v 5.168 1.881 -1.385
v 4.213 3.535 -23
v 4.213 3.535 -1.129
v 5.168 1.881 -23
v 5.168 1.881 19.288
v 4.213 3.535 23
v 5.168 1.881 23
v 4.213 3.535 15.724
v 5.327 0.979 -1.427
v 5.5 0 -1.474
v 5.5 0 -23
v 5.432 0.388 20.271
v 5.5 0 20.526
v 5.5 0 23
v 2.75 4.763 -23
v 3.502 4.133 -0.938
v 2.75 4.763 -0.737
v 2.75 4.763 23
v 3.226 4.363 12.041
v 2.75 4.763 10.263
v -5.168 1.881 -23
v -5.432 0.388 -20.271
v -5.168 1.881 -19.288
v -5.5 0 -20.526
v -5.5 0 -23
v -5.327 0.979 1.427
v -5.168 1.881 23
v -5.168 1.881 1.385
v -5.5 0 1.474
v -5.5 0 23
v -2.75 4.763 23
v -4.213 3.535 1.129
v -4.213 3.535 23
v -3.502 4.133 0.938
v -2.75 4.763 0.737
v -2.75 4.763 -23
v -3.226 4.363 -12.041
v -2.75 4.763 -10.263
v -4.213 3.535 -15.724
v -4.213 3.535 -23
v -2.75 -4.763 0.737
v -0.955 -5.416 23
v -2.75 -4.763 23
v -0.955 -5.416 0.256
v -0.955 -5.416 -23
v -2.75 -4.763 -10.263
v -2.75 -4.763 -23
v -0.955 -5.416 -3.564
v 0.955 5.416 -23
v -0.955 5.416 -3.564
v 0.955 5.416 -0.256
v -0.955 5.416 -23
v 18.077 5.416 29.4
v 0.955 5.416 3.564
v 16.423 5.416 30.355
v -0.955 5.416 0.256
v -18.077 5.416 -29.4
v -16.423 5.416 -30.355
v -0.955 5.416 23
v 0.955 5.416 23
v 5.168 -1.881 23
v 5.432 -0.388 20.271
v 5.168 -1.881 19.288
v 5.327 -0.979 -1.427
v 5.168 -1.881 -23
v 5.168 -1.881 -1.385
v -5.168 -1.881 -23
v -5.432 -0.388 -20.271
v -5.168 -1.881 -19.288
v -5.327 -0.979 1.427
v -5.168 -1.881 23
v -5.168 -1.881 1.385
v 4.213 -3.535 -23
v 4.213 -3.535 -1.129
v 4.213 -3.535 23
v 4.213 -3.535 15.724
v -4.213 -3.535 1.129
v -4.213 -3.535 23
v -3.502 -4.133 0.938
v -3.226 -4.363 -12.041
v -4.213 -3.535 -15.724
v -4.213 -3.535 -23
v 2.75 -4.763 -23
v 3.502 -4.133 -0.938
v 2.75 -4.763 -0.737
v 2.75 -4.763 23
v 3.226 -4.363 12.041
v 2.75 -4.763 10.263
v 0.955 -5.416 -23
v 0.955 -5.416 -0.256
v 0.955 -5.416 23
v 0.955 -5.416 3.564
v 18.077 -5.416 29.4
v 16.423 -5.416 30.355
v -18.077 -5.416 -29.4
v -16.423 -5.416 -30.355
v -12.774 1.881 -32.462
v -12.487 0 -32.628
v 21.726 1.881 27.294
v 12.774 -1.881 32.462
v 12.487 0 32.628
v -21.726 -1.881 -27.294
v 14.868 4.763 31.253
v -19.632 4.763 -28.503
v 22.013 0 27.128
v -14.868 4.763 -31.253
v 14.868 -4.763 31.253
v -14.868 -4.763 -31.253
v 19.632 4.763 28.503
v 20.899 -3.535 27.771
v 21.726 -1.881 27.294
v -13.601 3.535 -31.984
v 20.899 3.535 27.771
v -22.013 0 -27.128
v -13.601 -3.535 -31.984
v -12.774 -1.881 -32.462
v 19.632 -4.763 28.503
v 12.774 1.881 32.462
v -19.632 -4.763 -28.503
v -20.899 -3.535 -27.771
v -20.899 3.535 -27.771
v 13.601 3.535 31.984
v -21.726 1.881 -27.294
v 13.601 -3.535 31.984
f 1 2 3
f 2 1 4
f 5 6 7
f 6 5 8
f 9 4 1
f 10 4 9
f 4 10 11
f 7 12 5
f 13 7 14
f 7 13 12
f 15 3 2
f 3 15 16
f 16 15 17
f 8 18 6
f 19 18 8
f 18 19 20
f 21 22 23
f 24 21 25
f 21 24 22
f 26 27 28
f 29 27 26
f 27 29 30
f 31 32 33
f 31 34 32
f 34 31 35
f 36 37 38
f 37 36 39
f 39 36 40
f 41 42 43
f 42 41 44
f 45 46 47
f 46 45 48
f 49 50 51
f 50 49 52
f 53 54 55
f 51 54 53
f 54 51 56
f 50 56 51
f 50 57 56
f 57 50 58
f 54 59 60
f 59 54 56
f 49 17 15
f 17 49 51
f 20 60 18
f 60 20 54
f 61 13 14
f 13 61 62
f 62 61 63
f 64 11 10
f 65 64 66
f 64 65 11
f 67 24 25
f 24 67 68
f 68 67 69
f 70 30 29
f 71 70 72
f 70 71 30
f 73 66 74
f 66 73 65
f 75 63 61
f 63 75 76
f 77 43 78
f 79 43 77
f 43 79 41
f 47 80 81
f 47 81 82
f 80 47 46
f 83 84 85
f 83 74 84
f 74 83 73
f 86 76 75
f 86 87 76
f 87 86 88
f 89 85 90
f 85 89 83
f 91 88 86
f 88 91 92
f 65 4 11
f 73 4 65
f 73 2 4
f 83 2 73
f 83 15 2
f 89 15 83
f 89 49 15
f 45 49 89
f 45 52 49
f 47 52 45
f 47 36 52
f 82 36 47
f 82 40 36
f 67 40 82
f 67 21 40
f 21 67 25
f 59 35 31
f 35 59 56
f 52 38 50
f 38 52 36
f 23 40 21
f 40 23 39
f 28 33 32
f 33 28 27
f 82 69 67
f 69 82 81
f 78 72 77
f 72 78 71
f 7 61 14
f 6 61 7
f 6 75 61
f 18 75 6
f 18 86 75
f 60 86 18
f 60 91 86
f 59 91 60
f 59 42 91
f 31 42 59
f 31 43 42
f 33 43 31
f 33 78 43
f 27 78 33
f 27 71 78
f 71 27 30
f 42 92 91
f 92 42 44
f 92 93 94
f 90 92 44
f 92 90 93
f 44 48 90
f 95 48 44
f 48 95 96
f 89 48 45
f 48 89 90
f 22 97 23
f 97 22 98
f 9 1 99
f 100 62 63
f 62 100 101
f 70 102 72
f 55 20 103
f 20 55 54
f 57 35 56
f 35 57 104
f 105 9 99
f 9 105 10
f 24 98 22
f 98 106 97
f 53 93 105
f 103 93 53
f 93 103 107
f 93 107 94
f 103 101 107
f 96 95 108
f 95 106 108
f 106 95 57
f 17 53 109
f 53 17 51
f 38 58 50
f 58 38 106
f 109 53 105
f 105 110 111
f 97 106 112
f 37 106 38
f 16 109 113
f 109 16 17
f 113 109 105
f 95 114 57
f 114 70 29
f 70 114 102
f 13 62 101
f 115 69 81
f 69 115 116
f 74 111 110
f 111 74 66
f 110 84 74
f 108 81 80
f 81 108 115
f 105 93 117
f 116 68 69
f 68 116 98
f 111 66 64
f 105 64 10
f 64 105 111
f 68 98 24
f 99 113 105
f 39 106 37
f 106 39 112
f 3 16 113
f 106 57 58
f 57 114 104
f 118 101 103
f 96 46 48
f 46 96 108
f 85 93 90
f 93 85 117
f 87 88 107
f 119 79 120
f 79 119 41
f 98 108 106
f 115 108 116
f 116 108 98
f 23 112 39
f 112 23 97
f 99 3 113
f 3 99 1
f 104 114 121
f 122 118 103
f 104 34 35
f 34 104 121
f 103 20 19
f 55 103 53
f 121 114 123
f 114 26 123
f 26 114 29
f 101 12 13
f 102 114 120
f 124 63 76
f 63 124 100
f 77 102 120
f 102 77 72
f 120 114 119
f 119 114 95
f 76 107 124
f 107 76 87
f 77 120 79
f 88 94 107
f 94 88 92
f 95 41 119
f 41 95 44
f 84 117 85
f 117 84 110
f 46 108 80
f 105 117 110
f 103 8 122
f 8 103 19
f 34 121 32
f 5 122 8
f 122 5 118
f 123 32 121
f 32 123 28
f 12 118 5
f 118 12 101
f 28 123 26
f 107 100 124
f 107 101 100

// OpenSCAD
// Parametric Cable Port & Clamp
// Inspired by the Prusa cable clips on the MK3, but better.

// cable cross-section, in mm. Use a single number for a round cable.
cable_cross_section = [11, 9];
entry_angle = 30;

champfer = 2;
clip_height = 15;

wall_thickness = 2;
inset = 2;

// to determine the outer diameter of the main cylinder....
// ((clip_height + champfer) * tan(entry_angle)) +
// cable_cross_section[0] * tan(90 - entry_angle)

cylinder(d = max(cable_cross_section), 
             h = 2 * (champfer + inset + wall_thickness + clip_height + champfer),
             center = true);
             
cable(cable_cross_section, entry_angle);

module cable(cable_cross_section, entry_angle) {
    rotate([0, entry_angle, 0])
//        resize([cable_cross_section[0], cable_cross_section[1], 0])
            cylinder(d = max(cable_cross_section),
                         h = 3 * (champfer + inset + wall_thickness + clip_height + champfer),
                         center = true);
}


    
